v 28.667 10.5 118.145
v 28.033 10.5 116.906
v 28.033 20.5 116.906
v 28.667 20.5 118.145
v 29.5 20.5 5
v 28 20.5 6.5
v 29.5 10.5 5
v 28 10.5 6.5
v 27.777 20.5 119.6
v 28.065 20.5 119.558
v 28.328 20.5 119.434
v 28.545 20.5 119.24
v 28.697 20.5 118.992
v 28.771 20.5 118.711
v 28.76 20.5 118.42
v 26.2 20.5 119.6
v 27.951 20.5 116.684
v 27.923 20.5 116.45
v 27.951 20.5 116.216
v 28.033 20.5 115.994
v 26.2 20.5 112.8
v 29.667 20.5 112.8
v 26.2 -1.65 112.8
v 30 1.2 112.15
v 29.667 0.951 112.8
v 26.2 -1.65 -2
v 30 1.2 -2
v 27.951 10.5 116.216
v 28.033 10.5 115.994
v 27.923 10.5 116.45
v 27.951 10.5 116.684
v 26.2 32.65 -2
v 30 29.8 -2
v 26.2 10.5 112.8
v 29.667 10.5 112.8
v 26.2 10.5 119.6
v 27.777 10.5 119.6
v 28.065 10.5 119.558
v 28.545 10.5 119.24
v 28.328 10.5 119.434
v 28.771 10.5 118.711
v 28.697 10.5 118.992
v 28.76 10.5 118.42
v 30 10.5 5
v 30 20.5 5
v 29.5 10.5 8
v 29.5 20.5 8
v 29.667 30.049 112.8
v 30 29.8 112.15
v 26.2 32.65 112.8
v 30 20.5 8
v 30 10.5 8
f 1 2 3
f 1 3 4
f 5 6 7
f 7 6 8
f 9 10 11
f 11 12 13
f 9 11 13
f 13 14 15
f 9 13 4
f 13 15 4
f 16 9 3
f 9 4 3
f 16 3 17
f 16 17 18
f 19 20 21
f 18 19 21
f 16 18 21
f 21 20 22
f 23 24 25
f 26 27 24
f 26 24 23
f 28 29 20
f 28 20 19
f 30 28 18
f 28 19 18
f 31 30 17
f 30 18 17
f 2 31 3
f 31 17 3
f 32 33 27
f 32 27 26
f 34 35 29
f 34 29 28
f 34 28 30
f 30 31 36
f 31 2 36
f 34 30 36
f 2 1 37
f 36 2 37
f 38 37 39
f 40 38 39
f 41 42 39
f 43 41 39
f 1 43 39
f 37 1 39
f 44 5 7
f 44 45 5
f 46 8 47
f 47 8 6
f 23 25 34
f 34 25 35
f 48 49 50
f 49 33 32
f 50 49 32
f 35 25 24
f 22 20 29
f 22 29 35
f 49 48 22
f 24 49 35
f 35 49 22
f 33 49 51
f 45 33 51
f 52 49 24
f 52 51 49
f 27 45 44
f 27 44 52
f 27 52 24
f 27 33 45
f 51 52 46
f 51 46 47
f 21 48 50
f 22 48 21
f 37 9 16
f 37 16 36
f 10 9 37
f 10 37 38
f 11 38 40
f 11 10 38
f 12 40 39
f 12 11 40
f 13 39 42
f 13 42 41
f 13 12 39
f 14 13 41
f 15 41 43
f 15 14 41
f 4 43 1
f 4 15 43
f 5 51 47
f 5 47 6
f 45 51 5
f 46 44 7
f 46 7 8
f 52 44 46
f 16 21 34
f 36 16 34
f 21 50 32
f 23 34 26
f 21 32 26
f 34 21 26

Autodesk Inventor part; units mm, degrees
ref_plane "YZ Plane" through (0, 0, 0) normal (1, 0, 0) x (0, 1, 0)
ref_plane "Work Plane3" through (0, -2, -2) normal (0, 0, -1) x (-1, 0, 0)
sketch "Sketch4" plane through (0, -2, -2) normal (0, 0, -1) x (-1, 0, 0)
  line L0 (-30, 33) -> (-30, 34) projected
  line L1 (3, -2) -> (-26, -2) projected
  line L2 (7, 2) -> (7, 34) projected
  line L3 (3, 38) -> (-26, 38) projected
  line L4 (-27, 17.5) -> (-42, 17.5)
  line L5 (-30, 3.2) -> (-26, 0.2)
  line L6 (-26.2, 0.2) -> (-26.2, 17.5)
  line L7 (-30, 3.2) -> (-30, 17.5)
  line L8 (-30, 31.8) -> (-26, 34.8)
  line L9 (-26.2, 34.8) -> (-26.2, 17.5)
  line L10 (-30, 31.8) -> (-30, 17.5)
  line L11 (-26.2, 3.2) -> (-25.2, 3.2)
  line L12 (-25.2, 3.2) -> (-25.2, 17.5)
  line L13 (-26.2, 31.8) -> (-25.2, 31.8)
  line L14 (-25.2, 31.8) -> (-25.2, 17.5)
  line L15 (-26, 0) -> (-30, 3) projected
  circle A0 centre (-11.5, 18) radius 8 projected
  arc A1 (3, -2) -> (7, 2) centre (3, 2) ccw projected
  arc A2 (7, 34) -> (3, 38) centre (3, 34) ccw projected
  arc A3 (-26, 38) -> (-30, 34) centre (-26, 34) ccw projected
  line L16 (-30, 33) -> (-26, 36) projected
  line L17 (-26, 36) -> (-26, 0) projected
  line L18 (-30, 2) -> (-30, 3) projected
  arc A4 (-30, 2) -> (-26, -2) centre (-26, 2) ccw projected
  point P0 (0, 2)
  point P1 (-26.2, 0.35)
  point P2 (-26.2, 34.65)
  point P3 (-26.2, 31.8)
  point P4 (-26, 33)
  point P5 (-26, 2)
  dimension "d55" = 1
  dimension "d56" = 4
  dimension "d57" = 3
  dimension "d59" = 3.8
extrude "Whole Cover" add sketch "Sketch4" against normal blind 122 contours L9 L6 L5 L7 L10 L8
ref_plane "Work Plane4" through (0, 15.5, 120) normal (0, -1, 0) x (0, 0, -1)
sketch "Sketch5" plane through (0, 15.5, 120) normal (0, -1, 0) x (0, 0, -1)
  line L0 (122, 30) -> (0, 30) projected
  line L1 (122, 26.2) -> (0, 26.2) projected
  line L2 (0, 26.2) -> (0, 30)
  line L3 (7.85, 30) -> (-0.75, 30)
  line L4 (3.55, 30) -> (3.55, 27.8)
  line L5 (3.0945, 28.033) -> (-0.75, 30)
  line L6 (4.0055, 28.033) -> (7.85, 30)
  arc A0 (3.0945, 28.033) -> (4.0055, 28.033) centre (3.55, 28.9233) ccw
  point P0 (120, 0)
  point P1 (0, 29.6163)
  point P2 (0, 30)
  dimension "d45" = 8.6
  dimension "d47" = 2.2
  dimension "d48" = 1
extrude "Snap fit" cut sketch "Sketch5" along normal through all both and the other way through all
sketch "Sketch6" plane through (30, 1.2, -2) normal (1, 0, 0) x (0, 0, -1)
  line L0 (0, -2.85) -> (0, 31.45) projected
  line L1 (0, 14.3) -> (-7, 14.3) construction
  line L2 (-7, 9.3) -> (-10, 9.3)
  line L3 (-10, 9.3) -> (-10, 19.3)
  line L4 (-10, 19.3) -> (-7, 19.3)
  line L5 (-7, 19.3) -> (-7, 9.3)
  point P0 (-2, -1.2)
  dimension "d15" = 3
  dimension "d16" = 10
  dimension "d17" = 7
extrude "Grip" cut sketch "Sketch6" against normal blind 2
chamfer "Grip Chamfer" distance 1.5 angle 45 2 edges at (28, 15.5, 8) (28, 15.5, 5)
sketch "Sketch9" plane through (30, 1.2, -2) normal (1, 0, 0) x (0, 0, -1)
  line L0 (0, 0) -> (-122, 0) projected
  line L1 (-122, 31.45) -> (-122, -2.85) projected
  line L2 (-122, 14.3) -> (-114.6731, 14.3)
  line L3 (0, -2.85) -> (-122, -2.85) projected
  line L4 (-122, -2.85) -> (-114.5, -2.85)
  line L5 (-114.5, -2.85) -> (-114.5, 0.15)
  line L6 (-114.5, 0.15) -> (-122, 0.15)
  line L7 (-122, 0.15) -> (-122, -2.85)
  line L8 (-122, 31.45) -> (-114.5, 31.45)
  line L9 (-114.5, 31.45) -> (-114.5, 28.45)
  line L10 (-114.5, 28.45) -> (-122, 28.45)
  line L11 (-122, 28.45) -> (-122, 31.45)
  line L12 (-122, 28.45) -> (-121.6, 28.45)
  line L13 (-121.6, 28.45) -> (-121.6, 0.15)
  line L14 (-121.6, 0.15) -> (-122, 0.15)
  line L15 (-122, 0.15) -> (-122, 28.45)
  line L16 (-117.25, 0.15) -> (-117.25, -2.85)
  line L17 (-117.25, 28.45) -> (-117.25, 31.45)
  line L18 (-114.5, 9.3) -> (-122.5, 9.3)
  line L19 (-122.5, 9.3) -> (-122.5, 19.3)
  line L20 (-122.5, 19.3) -> (-114.5, 19.3)
  line L21 (-114.5, 19.3) -> (-114.5, 9.3)
  line L22 (-114.5, 0.15) -> (-114.5, 9.3)
  line L23 (-114.5, 19.3) -> (-114.5, 28.45)
  line L24 (-114.8, -2.85) -> (-114.8, 9.3)
  line L25 (-114.8, 31.45) -> (-114.8, 19.3)
  point P0 (-2, -1.2)
  point P1 (-117.25, 0)
  point P2 (-117.25, 28.6)
  point P3 (-122, 28.6)
  point P4 (-117.25, 0)
  point P5 (-114.5, 0)
  point P6 (-121.6, 9.3)
  point P7 (-121.6, 19.3)
  point P8 (-114.8, 19.3)
  dimension "d41" = 7.5
  dimension "d42" = 3
  dimension "d43" = 0.4
  dimension "d44" = 2.75
  dimension "d49" = 8
  dimension "d50" = 10
  dimension "d60" = 0.3
extrude "Corner Cut" cut sketch "Sketch9" against normal through all contours L24 L3 L16 L0 | L0 L16 L6 L24 | L16 L3 L1 L0 | L0 L1 L6 L16 | L6 L13 L18 L24 | L1 L18 L13 L6 | L18 L1 L2 L13 | L20 L13 L10 L25 | L2 L1 L20 L13 | L20 L1 L10 L13 | L10 L17 L8 L25 | L10 L1 L8 L17
fillet "Fillet5" radius 1 1 edges at (29.4116, 15.5, 119.6)
properties part number "enclosure cover_3DPrint"
